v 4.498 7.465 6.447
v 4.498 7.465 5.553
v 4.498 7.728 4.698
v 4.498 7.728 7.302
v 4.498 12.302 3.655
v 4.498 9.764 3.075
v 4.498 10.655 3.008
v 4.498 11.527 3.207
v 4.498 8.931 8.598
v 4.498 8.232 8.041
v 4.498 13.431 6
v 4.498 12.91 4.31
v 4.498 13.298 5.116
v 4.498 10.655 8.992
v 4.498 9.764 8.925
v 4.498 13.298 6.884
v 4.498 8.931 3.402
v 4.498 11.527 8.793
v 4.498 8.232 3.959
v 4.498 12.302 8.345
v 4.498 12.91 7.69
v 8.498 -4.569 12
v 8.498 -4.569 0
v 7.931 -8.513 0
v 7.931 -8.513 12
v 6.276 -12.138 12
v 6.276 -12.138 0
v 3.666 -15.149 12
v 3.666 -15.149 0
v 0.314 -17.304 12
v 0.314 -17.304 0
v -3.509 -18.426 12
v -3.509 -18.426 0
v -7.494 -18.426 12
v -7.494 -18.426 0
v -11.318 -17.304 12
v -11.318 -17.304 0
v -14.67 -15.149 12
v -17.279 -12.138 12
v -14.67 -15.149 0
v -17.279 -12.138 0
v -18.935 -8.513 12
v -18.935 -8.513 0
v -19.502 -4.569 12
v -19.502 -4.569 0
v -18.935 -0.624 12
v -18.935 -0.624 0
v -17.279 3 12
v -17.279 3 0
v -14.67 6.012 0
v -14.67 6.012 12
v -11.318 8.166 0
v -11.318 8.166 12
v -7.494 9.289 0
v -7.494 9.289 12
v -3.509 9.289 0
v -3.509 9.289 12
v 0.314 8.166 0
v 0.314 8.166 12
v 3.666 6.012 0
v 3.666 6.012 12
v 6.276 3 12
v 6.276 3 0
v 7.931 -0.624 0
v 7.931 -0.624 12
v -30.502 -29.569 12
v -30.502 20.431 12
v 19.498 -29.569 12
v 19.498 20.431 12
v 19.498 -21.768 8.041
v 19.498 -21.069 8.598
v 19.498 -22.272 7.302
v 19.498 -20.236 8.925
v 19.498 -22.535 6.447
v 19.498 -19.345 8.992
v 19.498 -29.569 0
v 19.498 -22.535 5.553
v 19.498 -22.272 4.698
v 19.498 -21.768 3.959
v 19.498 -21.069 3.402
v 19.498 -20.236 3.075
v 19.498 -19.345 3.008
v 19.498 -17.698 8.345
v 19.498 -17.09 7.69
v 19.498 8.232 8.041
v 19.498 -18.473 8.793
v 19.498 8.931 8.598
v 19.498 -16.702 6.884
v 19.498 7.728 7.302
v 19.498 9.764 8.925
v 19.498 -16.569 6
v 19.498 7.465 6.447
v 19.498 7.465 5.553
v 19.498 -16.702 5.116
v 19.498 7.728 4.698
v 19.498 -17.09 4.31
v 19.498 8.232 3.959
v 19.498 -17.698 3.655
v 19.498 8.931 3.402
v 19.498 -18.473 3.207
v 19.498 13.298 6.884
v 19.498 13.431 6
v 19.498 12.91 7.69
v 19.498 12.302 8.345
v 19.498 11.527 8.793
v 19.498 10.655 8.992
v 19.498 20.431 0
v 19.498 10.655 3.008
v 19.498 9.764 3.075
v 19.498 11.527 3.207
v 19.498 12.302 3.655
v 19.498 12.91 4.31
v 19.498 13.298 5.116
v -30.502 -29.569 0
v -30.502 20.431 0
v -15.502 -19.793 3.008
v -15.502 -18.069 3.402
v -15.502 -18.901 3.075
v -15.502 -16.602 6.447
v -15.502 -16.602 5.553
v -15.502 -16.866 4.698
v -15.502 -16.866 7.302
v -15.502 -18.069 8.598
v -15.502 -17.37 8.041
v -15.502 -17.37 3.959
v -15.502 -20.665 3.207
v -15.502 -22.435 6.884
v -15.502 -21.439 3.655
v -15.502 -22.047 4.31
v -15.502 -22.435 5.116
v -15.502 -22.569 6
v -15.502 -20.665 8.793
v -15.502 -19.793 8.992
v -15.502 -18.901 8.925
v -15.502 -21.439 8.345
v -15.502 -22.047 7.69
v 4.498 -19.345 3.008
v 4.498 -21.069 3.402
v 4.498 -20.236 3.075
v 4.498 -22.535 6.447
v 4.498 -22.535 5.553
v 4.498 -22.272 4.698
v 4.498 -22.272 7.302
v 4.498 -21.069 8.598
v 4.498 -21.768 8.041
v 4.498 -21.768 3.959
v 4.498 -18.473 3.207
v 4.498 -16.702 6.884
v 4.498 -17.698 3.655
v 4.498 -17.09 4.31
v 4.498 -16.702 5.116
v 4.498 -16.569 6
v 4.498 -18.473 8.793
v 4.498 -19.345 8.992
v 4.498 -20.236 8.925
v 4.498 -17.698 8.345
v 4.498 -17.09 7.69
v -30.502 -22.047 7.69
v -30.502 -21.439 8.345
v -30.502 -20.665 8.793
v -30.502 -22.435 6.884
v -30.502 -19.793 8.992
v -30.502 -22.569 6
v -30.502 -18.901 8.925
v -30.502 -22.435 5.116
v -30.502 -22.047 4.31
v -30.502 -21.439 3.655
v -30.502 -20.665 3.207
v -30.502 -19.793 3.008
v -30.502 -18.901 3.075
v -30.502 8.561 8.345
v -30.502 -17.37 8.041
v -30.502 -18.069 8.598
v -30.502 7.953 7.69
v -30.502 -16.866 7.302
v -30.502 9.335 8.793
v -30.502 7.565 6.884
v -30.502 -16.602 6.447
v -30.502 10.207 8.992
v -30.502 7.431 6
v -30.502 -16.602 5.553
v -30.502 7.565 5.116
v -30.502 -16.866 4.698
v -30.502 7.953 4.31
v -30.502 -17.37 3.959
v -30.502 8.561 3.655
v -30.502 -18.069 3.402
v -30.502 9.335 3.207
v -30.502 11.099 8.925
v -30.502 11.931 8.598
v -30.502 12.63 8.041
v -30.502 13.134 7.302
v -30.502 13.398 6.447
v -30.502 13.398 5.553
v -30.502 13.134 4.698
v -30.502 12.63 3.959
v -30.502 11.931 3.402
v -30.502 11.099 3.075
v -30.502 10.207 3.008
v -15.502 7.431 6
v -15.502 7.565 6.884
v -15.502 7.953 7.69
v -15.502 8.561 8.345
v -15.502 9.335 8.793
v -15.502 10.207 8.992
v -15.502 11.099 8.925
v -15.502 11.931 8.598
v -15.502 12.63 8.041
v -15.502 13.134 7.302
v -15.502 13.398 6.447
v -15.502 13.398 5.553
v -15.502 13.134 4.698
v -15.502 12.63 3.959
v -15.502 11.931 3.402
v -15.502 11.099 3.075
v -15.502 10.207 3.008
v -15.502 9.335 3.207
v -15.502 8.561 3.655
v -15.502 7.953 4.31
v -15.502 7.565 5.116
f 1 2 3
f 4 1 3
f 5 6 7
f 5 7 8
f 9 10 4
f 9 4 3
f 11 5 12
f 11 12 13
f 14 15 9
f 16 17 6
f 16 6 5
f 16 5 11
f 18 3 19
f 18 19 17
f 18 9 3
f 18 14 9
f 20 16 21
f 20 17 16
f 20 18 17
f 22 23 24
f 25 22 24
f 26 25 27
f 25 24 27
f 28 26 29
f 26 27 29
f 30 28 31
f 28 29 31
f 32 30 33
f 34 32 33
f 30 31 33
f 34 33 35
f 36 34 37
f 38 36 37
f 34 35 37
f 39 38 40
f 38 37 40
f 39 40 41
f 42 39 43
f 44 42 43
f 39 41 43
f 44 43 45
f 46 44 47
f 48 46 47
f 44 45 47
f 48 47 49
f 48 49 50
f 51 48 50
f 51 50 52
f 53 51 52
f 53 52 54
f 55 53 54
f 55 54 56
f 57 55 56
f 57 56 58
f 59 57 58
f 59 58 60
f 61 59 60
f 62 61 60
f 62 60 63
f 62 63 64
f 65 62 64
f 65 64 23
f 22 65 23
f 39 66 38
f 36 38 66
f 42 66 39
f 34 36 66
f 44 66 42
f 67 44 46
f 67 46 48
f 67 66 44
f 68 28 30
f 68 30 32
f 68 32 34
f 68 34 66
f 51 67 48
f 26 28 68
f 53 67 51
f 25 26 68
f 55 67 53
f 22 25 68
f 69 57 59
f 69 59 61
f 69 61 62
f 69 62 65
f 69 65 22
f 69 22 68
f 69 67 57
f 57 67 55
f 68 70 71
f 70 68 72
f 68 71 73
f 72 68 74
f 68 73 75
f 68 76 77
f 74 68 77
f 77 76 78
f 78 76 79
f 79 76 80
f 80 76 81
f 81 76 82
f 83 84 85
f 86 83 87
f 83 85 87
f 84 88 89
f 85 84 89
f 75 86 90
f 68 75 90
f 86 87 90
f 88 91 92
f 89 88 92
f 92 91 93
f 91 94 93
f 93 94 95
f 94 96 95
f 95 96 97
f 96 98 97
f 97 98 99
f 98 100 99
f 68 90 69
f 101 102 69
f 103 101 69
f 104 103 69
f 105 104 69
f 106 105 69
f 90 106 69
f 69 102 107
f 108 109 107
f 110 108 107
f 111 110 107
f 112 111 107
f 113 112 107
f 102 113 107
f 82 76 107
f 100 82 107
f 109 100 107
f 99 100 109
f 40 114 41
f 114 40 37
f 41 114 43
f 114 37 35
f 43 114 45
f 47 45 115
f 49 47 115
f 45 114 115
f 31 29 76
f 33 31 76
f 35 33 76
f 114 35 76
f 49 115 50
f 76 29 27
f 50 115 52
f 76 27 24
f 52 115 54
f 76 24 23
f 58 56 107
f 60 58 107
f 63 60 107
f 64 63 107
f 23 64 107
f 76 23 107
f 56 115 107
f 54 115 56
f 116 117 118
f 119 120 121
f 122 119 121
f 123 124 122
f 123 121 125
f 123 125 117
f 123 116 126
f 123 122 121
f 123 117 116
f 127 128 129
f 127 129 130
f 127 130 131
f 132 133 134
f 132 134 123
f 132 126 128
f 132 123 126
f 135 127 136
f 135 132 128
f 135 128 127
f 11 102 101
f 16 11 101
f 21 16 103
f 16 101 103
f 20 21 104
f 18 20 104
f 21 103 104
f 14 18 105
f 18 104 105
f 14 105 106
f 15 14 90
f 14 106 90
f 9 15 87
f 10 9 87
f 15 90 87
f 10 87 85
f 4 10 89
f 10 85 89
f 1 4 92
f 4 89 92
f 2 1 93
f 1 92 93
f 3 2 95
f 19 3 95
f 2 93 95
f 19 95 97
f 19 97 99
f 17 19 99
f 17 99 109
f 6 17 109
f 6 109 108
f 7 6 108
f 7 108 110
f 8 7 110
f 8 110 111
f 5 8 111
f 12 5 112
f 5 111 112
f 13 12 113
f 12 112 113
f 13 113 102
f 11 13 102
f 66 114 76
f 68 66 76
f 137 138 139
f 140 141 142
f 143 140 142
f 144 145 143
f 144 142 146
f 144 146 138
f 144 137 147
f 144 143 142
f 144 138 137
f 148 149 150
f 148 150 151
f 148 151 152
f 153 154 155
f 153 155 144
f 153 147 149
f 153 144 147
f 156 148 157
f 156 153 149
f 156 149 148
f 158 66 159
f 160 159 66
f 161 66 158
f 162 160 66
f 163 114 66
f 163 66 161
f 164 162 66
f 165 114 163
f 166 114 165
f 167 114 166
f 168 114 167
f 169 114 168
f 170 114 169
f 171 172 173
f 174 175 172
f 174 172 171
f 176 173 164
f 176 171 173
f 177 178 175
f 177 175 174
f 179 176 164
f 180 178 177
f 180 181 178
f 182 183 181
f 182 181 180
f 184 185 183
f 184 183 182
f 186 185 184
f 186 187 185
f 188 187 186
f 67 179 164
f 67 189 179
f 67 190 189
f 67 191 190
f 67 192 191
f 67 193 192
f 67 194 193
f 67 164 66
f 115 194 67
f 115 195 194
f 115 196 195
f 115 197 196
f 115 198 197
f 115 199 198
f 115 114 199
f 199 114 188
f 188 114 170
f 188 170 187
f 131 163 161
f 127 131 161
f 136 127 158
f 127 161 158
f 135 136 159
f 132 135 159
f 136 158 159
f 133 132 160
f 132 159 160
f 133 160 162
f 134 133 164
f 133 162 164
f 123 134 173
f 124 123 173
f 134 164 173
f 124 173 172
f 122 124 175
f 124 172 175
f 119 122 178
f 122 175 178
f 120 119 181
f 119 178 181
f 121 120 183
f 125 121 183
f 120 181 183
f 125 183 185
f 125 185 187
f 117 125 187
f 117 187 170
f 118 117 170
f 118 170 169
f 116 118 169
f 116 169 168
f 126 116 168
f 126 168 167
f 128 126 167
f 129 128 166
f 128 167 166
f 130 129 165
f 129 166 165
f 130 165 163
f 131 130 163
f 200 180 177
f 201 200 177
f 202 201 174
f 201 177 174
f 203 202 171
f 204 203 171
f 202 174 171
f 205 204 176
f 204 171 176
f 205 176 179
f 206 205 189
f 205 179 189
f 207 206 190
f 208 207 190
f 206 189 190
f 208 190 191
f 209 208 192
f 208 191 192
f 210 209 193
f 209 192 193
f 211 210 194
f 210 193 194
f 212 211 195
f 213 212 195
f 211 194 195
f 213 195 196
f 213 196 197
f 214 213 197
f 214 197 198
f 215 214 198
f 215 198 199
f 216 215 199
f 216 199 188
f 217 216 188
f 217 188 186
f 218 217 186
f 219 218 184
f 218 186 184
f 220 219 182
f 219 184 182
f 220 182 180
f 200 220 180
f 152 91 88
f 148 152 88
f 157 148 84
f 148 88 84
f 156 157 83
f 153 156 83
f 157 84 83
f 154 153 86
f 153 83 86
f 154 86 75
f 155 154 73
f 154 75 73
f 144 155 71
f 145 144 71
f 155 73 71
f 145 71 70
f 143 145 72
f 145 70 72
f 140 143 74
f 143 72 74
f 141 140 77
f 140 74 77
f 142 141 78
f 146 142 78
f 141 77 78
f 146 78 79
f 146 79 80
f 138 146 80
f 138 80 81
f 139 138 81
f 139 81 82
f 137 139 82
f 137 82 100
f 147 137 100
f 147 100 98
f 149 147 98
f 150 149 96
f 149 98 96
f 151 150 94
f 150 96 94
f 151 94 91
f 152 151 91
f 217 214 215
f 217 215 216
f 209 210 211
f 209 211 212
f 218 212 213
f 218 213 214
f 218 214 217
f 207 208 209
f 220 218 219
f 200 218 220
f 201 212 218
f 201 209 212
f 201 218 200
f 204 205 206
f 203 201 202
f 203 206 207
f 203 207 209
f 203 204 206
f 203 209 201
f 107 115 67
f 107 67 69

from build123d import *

# Parameters (mm, degrees)
F0_W     = 50
F0_H     = 50
F1_DEPTH = 12
F2_R     = 3
F3_DEPTH = 15
F4_R     = 3
F5_DEPTH = 15
F6_R     = 14
F7_DEPTH = 12.001


with BuildPart() as f1:
    # F0 (on Top) → F1 (new body)
    with BuildSketch(Plane.XY):
        with Locations((-5.501713, -4.568746)):
            Rectangle(F0_W, F0_H)
    extrude(amount=F1_DEPTH)

    # F2 (on face) → F3 (cut)
    with BuildSketch(Plane(origin=(-30.501713, 0, 0), x_dir=(0, -1, 0), z_dir=(-1, 0, 0))):
        with Locations((-10.431254, 6)):
            Circle(F2_R)
        with Locations((19.568746, 6)):
            Circle(F2_R)
    extrude(amount=-F3_DEPTH, mode=Mode.SUBTRACT)

    # F4 (on face) → F5 (cut)
    with BuildSketch(Plane.YZ.offset(19.498287)):
        with Locations((10.431254, 6)):
            Circle(F4_R)
        with Locations((-19.568746, 6)):
            Circle(F4_R)
    extrude(amount=-F5_DEPTH, mode=Mode.SUBTRACT)

    # F6 (on face) → F7 (cut, through all)
    with BuildSketch(Plane(origin=(0, 0, 0), x_dir=(1, 0, 0), z_dir=(0, 0, -1))):
        with Locations((-5.501713, 4.568746)):
            Circle(F6_R)
    extrude(amount=-F7_DEPTH, mode=Mode.SUBTRACT)


solid = f1.part
